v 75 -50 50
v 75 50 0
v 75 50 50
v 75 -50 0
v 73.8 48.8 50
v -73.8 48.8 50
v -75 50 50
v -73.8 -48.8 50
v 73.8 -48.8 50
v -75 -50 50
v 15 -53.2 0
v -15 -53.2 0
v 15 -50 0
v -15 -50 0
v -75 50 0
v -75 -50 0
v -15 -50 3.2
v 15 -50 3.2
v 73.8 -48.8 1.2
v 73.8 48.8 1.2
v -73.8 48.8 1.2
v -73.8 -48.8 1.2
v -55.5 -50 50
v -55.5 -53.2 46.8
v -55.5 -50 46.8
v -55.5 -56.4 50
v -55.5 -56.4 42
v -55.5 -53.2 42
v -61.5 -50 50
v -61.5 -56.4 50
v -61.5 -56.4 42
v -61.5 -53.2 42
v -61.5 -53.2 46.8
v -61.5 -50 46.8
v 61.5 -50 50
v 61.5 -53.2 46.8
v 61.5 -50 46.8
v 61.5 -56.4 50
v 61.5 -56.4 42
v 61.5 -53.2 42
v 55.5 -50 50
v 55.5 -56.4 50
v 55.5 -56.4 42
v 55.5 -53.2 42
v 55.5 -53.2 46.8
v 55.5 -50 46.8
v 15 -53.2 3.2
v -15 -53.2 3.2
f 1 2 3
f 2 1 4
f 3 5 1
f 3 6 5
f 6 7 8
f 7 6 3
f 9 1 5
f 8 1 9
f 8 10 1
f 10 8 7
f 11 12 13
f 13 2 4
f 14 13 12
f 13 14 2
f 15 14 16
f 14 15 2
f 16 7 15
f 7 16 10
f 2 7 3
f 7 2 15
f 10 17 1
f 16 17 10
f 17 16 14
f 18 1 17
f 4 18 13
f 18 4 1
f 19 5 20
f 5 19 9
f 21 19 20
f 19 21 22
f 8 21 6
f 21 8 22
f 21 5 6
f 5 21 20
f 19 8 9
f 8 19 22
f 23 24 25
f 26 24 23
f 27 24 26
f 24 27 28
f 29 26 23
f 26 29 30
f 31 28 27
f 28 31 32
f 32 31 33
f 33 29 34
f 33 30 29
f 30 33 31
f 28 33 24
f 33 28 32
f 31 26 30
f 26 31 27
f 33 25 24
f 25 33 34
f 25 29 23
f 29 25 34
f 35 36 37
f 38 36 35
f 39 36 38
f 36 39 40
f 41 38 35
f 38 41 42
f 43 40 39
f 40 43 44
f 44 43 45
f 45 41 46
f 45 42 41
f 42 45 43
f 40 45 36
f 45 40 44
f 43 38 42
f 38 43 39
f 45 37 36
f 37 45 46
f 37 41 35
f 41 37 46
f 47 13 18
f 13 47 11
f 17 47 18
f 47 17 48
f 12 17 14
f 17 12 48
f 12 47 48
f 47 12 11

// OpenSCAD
/*
 Creates a simple box that can be hung from a wire fence.  The
 default dimensions match a standard "chicken tractor" and can
 hold either food or water for about 4 chickens.

 If you want to hang on chicken wire, measure the distance between
 two horizontal twists and use that as the HangerPitch.
*/

BoxHeight = 50; // Height of box
BoxWidth = 150;  // Width
BoxDepth = 100;  // Depth
WallThickness = 1.2;  // Wall thickness
HangerWidth = 6; // Width of hanger
HangerHeight = 8; // Height of hanger
HangerPitch = 13; // Increments for hanger placement
HangerDepth = 3.2; // depth of hanger, also hanger offset

/*
  The rest of these are derived from
  the above.
*/
// Half values for translations
BoxHalfWidth = BoxWidth/2;
BoxHalfDepth = BoxDepth/2;
HangerHalfWidth = HangerWidth/2;
HangerInset = (HangerPitch-HangerWidth) / 2;

// Last possible offset for a hanger is based on the half width
HangerPitchCount = floor(BoxWidth/HangerPitch) -1;
HangerEdgeOffset = HangerPitch * HangerPitchCount / 2;

// Offsets for hanger.  Based on centering the hanger width within a hanger increment
LeftHangerPosition = -1 * (HangerEdgeOffset - HangerInset);
RightHangerPosition = HangerEdgeOffset - HangerWidth - HangerInset;
VerticalHangerOffset = BoxHeight - HangerHeight;
HangerOvershoot = HangerHeight - HangerDepth;
HangerOuterY = -1 * (BoxHalfDepth + (HangerDepth * 2));
HangerInnerY = -1 * (BoxHalfDepth + HangerDepth);

// spacer bar is based on the above
SpacerBarPosition = BoxHalfWidth / 5;
SpacerBarWidth = BoxWidth / 5;

// Create the main box, a simple cube with another smaller cube cut out
module MainBox() {
    translate([BoxHalfWidth*-1,BoxHalfDepth*-1,0]) {
        difference() {
            cube([BoxWidth,BoxDepth,BoxHeight]);
            translate([WallThickness,WallThickness,WallThickness]){
                cube([BoxWidth-(2*WallThickness),BoxDepth-(2*WallThickness),BoxHeight-WallThickness]);
            }
        }
    }
}

// Create a hanger, basically two overlapping cubes that will
// fit within the pitch supplied.
module Hanger(pos) {
    translate([pos,HangerOuterY,VerticalHangerOffset]) {
        cube([HangerWidth,HangerDepth,HangerHeight]);
        translate([0,HangerDepth,HangerOvershoot]) {
            cube([HangerWidth,HangerDepth,HangerDepth]);
        }
    }
}

// Spacer is placed on the bottom, to ensure the box stays upright when hung
module SpaceBar() {
    translate([-1 * SpacerBarPosition,HangerInnerY,0]) {
        cube([SpacerBarWidth,HangerDepth,HangerDepth]);
    }
}

MainBox();
Hanger(LeftHangerPosition);
Hanger(RightHangerPosition);
SpaceBar();
